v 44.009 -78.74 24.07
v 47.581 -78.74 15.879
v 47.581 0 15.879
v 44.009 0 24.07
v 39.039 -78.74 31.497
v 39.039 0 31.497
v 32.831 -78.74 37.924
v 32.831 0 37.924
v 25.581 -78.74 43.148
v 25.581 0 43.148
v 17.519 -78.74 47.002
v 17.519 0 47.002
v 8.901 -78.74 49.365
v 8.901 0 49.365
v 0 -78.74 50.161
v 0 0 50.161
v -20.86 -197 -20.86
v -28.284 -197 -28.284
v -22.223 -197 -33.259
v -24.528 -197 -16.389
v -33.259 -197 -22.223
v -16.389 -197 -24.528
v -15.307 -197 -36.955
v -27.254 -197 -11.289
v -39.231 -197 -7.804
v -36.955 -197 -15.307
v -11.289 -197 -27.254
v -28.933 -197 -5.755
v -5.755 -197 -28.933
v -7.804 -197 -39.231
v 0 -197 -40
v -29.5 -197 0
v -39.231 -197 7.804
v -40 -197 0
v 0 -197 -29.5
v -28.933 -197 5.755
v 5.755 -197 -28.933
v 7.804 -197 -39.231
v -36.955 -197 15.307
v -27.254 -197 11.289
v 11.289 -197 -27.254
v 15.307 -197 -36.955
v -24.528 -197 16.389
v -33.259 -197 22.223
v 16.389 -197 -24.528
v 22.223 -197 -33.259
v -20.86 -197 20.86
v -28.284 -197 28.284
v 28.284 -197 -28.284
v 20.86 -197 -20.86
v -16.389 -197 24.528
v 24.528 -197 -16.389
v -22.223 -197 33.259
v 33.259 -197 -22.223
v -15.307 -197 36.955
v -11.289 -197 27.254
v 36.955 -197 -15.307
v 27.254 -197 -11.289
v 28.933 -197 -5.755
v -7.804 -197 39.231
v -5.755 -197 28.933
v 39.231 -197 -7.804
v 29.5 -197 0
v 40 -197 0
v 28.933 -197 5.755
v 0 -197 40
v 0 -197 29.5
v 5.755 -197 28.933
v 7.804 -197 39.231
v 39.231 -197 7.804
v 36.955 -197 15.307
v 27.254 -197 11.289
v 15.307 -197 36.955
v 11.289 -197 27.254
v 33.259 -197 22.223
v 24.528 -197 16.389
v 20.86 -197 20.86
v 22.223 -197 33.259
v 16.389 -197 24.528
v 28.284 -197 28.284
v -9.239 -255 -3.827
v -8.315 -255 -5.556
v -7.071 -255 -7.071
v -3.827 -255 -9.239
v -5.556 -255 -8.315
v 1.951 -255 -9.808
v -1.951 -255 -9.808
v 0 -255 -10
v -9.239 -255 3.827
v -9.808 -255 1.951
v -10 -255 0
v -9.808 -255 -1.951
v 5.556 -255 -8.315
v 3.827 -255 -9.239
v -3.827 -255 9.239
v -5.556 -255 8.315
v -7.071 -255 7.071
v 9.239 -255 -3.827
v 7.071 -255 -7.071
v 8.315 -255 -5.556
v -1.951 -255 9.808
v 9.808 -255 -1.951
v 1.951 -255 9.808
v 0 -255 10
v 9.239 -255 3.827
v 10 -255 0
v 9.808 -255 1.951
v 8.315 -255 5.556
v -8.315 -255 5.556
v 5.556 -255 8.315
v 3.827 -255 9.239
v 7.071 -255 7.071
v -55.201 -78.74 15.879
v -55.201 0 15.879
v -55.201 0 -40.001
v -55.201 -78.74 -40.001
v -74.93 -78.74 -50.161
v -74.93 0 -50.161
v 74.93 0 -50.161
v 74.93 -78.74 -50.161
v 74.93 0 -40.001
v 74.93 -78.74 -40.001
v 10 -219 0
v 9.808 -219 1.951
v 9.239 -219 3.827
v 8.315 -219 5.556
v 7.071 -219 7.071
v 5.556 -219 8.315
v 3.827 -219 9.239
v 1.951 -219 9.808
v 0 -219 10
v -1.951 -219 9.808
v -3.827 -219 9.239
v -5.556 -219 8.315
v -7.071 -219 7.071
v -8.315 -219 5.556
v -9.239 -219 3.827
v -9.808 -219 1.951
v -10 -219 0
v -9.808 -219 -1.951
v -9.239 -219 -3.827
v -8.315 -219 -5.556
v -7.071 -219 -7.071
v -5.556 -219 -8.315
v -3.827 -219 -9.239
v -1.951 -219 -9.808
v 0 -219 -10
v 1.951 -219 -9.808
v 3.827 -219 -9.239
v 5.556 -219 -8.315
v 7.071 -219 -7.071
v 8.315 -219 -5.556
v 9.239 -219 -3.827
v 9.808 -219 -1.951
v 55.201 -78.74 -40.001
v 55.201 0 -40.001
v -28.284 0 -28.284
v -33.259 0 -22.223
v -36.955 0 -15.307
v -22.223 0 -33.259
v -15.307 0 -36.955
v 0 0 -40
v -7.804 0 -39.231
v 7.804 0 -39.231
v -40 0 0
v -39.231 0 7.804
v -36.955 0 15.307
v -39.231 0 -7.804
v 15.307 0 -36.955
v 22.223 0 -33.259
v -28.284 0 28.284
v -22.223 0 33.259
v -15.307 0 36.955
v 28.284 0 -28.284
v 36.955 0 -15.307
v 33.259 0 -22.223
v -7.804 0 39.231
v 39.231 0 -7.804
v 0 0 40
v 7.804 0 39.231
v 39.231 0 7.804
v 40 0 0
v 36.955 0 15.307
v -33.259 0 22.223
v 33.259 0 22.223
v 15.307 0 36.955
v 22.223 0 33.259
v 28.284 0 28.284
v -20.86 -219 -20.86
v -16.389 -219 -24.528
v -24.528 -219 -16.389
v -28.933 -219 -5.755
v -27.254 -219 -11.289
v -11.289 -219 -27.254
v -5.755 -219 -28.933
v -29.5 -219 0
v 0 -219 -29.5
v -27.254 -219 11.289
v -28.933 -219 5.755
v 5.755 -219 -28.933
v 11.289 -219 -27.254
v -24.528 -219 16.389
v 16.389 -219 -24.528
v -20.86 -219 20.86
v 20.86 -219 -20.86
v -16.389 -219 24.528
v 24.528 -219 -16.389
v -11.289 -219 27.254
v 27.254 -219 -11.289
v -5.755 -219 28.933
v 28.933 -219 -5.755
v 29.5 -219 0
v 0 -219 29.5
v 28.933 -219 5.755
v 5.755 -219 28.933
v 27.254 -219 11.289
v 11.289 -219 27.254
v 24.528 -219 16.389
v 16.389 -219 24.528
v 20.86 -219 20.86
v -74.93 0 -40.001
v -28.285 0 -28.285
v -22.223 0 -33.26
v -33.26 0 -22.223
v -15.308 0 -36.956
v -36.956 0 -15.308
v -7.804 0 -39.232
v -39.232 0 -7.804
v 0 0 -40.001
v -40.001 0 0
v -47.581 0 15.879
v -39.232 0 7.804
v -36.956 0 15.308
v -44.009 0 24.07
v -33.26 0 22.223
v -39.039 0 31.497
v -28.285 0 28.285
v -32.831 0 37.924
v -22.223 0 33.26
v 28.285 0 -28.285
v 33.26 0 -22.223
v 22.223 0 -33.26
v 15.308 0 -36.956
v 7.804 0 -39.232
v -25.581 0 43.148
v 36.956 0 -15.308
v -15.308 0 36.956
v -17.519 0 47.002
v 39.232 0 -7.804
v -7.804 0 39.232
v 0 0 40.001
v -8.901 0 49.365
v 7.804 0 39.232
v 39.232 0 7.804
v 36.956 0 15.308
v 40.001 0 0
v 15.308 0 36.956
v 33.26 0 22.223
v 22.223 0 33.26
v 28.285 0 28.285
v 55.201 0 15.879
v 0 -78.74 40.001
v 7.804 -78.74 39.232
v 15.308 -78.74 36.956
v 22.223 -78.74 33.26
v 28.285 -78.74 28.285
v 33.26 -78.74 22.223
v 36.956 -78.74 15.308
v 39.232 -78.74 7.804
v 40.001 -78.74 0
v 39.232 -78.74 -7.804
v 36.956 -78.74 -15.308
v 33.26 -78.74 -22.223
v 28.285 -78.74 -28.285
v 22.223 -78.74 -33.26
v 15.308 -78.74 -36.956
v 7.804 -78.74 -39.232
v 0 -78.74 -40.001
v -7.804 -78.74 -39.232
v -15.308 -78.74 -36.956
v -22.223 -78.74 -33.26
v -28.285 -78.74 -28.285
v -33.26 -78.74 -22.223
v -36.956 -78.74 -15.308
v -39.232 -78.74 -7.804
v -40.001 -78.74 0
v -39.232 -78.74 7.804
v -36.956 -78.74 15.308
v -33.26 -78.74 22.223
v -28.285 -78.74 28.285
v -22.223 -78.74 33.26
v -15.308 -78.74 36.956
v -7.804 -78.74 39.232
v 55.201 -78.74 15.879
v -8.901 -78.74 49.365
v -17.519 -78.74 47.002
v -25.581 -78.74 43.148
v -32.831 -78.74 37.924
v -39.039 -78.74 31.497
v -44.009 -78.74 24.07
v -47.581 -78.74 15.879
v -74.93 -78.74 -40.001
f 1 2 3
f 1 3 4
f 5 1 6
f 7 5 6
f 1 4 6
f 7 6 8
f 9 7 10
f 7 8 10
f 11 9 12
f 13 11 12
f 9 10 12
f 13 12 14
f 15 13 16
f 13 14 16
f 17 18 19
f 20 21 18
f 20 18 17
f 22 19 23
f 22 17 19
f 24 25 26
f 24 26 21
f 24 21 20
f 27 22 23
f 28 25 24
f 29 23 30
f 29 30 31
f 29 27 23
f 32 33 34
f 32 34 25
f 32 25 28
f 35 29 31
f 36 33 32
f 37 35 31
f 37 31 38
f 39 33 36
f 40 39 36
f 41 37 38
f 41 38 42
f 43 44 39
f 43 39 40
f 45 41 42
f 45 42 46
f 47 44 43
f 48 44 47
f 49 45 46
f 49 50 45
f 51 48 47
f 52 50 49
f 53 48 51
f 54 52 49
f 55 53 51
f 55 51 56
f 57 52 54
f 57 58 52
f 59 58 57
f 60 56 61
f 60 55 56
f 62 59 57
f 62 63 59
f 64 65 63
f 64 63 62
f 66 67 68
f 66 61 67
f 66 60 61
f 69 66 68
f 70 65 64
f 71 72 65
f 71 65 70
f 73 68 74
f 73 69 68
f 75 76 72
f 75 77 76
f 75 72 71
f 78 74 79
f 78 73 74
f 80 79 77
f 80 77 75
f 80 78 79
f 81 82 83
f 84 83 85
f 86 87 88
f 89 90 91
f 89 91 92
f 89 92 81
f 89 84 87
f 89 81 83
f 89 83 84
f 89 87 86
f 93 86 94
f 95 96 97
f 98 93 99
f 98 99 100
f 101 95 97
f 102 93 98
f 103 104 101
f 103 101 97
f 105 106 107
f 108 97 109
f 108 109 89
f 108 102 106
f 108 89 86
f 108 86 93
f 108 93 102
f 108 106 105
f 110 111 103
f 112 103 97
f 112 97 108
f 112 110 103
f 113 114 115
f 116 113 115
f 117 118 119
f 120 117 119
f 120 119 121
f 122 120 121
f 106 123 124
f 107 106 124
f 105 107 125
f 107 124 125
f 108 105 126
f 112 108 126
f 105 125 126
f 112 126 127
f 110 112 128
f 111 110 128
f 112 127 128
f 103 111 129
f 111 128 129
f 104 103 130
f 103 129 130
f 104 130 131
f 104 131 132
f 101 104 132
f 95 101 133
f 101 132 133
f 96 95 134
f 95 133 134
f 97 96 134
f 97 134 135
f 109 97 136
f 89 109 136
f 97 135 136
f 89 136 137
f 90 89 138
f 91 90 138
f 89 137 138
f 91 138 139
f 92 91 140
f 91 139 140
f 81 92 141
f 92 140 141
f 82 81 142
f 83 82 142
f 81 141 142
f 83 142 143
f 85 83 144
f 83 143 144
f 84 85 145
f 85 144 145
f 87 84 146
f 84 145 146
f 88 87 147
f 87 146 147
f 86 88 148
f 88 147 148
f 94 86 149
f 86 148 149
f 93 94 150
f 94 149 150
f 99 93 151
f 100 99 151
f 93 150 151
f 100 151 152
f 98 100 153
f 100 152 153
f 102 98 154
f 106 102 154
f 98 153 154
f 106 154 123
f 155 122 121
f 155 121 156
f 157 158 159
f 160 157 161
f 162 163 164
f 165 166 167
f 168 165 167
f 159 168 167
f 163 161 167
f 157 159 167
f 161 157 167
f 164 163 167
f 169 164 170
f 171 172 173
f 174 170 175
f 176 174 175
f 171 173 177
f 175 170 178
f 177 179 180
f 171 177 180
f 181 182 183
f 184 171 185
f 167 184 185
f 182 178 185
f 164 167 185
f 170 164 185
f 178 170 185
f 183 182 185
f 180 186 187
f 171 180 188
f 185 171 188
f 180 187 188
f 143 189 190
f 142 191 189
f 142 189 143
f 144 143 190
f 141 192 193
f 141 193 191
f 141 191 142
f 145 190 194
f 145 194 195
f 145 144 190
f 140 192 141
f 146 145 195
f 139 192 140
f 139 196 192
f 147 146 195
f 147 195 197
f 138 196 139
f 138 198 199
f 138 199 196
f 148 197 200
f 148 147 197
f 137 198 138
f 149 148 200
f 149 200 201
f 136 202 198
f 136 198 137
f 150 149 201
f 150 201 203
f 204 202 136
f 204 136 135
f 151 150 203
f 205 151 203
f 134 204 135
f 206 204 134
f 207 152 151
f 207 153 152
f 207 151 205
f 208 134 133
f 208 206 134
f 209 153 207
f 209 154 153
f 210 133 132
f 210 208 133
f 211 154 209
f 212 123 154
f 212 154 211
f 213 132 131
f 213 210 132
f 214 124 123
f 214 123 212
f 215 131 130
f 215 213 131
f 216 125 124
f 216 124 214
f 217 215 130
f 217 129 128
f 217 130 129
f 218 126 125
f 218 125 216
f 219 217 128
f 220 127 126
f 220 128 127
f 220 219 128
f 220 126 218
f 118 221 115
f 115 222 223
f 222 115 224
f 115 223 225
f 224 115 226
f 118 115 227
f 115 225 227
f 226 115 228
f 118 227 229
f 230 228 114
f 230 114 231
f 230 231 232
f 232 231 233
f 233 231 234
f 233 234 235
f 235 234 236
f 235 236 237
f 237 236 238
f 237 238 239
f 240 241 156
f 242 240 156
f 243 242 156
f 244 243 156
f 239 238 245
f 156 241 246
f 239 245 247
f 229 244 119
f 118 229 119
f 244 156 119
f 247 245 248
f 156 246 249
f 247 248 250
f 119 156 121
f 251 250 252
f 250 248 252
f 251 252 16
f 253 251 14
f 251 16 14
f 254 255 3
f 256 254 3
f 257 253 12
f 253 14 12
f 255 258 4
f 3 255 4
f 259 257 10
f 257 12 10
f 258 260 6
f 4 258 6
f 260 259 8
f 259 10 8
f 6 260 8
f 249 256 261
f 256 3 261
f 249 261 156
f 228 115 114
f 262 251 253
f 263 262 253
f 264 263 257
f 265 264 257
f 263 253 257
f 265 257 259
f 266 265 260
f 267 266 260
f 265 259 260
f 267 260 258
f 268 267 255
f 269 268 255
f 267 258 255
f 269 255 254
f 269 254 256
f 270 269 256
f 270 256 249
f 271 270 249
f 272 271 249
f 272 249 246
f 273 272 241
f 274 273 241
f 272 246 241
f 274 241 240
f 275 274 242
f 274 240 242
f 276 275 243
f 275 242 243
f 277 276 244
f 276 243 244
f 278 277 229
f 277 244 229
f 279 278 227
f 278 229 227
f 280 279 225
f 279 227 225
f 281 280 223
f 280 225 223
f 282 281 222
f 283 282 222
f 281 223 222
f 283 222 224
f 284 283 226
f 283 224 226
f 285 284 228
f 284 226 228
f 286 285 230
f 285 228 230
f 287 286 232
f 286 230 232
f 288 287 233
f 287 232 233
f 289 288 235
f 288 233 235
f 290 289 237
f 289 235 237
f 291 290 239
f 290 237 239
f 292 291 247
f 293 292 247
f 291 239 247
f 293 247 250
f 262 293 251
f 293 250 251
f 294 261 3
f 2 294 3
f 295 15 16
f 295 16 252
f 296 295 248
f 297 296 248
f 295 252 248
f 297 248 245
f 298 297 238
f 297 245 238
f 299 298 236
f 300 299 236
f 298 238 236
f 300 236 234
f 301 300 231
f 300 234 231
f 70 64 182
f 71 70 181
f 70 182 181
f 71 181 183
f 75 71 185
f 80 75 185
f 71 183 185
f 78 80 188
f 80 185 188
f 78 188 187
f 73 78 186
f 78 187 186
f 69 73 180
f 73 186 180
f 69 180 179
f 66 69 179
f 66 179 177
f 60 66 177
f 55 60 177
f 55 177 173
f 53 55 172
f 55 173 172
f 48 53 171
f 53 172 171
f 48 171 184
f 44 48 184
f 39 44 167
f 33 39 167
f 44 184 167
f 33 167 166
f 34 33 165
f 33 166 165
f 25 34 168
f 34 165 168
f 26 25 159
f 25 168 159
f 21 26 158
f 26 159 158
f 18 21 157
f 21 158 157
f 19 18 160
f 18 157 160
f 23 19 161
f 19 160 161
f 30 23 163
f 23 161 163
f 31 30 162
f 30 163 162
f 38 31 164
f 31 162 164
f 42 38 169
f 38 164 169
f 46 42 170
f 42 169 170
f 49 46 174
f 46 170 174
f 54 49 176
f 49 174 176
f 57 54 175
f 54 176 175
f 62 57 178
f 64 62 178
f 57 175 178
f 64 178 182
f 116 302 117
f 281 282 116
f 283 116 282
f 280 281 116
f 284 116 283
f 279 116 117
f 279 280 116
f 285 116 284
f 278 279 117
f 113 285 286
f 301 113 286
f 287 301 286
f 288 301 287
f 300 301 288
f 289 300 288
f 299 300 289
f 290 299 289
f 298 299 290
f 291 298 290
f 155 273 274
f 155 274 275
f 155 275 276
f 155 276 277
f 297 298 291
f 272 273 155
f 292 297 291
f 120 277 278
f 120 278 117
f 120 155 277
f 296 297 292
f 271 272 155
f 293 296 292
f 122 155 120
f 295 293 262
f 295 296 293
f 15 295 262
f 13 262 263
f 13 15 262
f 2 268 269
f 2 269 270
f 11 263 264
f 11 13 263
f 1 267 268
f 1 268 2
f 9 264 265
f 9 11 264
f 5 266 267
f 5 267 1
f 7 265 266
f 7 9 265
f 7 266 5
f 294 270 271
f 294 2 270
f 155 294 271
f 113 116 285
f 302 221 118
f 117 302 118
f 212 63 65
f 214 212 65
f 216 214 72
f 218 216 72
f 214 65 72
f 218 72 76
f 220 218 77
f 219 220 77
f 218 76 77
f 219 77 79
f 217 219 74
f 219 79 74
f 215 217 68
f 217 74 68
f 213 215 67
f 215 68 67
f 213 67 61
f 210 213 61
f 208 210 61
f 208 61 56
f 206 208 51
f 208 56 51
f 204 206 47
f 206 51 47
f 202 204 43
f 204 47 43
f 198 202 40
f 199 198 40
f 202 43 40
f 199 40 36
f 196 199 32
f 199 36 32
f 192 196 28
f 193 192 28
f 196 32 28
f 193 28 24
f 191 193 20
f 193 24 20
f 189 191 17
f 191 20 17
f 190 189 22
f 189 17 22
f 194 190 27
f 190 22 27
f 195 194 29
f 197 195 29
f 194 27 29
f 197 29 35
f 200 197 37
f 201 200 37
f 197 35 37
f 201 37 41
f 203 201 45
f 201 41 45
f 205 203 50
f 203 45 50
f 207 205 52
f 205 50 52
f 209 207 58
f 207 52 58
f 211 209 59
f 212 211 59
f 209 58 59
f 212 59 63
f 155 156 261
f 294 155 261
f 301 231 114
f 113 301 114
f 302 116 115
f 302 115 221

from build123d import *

# Parameters (mm, degrees)
F0_R     = 40
F1_DEPTH = 197
F2_R     = 29.5
F3_DEPTH = 22
F4_R     = 10
F5_DEPTH = 36
F7_DEPTH = 78.74


with BuildPart() as f1:
    # F0 (on Front) → F1 (new body)
    with BuildSketch(Plane.XZ):
        Circle(F0_R)
    extrude(amount=F1_DEPTH)

    # F2 (on face) → F3 (join)
    with BuildSketch(Plane.XZ.offset(197)):
        Circle(F2_R)
    extrude(amount=F3_DEPTH)

    # F4 (on face) → F5 (join)
    with BuildSketch(Plane.XZ.offset(219)):
        Circle(F4_R)
    extrude(amount=F5_DEPTH)


with BuildPart() as f7:
    # F6 (on Front) → F7 (new body)
    with BuildSketch(Plane.XZ):
        with BuildLine():
            Line((-74.93, -50.161), (0, -50.161))
            Line((0, -50.161), (74.93, -50.161))
            Line((74.93, -50.161), (74.93, -40.001))
            Line((74.93, -40.001), (55.201333, -40.001))
            Line((55.201333, -40.001), (55.201333, 15.879))
            Line((55.201333, 15.879), (47.581333, 15.879))
            ThreePointArc((47.581333, 15.879), (29.322512, 40.697865), (0, 50.161))
            ThreePointArc((0, 50.161), (-29.322512, 40.697865), (-47.581333, 15.879))
            Line((-47.581333, 15.879), (-55.201333, 15.879))
            Line((-55.201333, 15.879), (-55.201333, -40.001))
            Line((-55.201333, -40.001), (-74.93, -40.001))
            Line((-74.93, -40.001), (-74.93, -50.161))
        make_face()
        with BuildLine():
            ThreePointArc((0, -40.001), (-40.001, 0), (0, 40.001))
            ThreePointArc((0, 40.001), (40.001, 0), (0, -40.001))
        make_face(mode=Mode.SUBTRACT)
    extrude(amount=F7_DEPTH)


solid = Compound([f1.part, f7.part])
